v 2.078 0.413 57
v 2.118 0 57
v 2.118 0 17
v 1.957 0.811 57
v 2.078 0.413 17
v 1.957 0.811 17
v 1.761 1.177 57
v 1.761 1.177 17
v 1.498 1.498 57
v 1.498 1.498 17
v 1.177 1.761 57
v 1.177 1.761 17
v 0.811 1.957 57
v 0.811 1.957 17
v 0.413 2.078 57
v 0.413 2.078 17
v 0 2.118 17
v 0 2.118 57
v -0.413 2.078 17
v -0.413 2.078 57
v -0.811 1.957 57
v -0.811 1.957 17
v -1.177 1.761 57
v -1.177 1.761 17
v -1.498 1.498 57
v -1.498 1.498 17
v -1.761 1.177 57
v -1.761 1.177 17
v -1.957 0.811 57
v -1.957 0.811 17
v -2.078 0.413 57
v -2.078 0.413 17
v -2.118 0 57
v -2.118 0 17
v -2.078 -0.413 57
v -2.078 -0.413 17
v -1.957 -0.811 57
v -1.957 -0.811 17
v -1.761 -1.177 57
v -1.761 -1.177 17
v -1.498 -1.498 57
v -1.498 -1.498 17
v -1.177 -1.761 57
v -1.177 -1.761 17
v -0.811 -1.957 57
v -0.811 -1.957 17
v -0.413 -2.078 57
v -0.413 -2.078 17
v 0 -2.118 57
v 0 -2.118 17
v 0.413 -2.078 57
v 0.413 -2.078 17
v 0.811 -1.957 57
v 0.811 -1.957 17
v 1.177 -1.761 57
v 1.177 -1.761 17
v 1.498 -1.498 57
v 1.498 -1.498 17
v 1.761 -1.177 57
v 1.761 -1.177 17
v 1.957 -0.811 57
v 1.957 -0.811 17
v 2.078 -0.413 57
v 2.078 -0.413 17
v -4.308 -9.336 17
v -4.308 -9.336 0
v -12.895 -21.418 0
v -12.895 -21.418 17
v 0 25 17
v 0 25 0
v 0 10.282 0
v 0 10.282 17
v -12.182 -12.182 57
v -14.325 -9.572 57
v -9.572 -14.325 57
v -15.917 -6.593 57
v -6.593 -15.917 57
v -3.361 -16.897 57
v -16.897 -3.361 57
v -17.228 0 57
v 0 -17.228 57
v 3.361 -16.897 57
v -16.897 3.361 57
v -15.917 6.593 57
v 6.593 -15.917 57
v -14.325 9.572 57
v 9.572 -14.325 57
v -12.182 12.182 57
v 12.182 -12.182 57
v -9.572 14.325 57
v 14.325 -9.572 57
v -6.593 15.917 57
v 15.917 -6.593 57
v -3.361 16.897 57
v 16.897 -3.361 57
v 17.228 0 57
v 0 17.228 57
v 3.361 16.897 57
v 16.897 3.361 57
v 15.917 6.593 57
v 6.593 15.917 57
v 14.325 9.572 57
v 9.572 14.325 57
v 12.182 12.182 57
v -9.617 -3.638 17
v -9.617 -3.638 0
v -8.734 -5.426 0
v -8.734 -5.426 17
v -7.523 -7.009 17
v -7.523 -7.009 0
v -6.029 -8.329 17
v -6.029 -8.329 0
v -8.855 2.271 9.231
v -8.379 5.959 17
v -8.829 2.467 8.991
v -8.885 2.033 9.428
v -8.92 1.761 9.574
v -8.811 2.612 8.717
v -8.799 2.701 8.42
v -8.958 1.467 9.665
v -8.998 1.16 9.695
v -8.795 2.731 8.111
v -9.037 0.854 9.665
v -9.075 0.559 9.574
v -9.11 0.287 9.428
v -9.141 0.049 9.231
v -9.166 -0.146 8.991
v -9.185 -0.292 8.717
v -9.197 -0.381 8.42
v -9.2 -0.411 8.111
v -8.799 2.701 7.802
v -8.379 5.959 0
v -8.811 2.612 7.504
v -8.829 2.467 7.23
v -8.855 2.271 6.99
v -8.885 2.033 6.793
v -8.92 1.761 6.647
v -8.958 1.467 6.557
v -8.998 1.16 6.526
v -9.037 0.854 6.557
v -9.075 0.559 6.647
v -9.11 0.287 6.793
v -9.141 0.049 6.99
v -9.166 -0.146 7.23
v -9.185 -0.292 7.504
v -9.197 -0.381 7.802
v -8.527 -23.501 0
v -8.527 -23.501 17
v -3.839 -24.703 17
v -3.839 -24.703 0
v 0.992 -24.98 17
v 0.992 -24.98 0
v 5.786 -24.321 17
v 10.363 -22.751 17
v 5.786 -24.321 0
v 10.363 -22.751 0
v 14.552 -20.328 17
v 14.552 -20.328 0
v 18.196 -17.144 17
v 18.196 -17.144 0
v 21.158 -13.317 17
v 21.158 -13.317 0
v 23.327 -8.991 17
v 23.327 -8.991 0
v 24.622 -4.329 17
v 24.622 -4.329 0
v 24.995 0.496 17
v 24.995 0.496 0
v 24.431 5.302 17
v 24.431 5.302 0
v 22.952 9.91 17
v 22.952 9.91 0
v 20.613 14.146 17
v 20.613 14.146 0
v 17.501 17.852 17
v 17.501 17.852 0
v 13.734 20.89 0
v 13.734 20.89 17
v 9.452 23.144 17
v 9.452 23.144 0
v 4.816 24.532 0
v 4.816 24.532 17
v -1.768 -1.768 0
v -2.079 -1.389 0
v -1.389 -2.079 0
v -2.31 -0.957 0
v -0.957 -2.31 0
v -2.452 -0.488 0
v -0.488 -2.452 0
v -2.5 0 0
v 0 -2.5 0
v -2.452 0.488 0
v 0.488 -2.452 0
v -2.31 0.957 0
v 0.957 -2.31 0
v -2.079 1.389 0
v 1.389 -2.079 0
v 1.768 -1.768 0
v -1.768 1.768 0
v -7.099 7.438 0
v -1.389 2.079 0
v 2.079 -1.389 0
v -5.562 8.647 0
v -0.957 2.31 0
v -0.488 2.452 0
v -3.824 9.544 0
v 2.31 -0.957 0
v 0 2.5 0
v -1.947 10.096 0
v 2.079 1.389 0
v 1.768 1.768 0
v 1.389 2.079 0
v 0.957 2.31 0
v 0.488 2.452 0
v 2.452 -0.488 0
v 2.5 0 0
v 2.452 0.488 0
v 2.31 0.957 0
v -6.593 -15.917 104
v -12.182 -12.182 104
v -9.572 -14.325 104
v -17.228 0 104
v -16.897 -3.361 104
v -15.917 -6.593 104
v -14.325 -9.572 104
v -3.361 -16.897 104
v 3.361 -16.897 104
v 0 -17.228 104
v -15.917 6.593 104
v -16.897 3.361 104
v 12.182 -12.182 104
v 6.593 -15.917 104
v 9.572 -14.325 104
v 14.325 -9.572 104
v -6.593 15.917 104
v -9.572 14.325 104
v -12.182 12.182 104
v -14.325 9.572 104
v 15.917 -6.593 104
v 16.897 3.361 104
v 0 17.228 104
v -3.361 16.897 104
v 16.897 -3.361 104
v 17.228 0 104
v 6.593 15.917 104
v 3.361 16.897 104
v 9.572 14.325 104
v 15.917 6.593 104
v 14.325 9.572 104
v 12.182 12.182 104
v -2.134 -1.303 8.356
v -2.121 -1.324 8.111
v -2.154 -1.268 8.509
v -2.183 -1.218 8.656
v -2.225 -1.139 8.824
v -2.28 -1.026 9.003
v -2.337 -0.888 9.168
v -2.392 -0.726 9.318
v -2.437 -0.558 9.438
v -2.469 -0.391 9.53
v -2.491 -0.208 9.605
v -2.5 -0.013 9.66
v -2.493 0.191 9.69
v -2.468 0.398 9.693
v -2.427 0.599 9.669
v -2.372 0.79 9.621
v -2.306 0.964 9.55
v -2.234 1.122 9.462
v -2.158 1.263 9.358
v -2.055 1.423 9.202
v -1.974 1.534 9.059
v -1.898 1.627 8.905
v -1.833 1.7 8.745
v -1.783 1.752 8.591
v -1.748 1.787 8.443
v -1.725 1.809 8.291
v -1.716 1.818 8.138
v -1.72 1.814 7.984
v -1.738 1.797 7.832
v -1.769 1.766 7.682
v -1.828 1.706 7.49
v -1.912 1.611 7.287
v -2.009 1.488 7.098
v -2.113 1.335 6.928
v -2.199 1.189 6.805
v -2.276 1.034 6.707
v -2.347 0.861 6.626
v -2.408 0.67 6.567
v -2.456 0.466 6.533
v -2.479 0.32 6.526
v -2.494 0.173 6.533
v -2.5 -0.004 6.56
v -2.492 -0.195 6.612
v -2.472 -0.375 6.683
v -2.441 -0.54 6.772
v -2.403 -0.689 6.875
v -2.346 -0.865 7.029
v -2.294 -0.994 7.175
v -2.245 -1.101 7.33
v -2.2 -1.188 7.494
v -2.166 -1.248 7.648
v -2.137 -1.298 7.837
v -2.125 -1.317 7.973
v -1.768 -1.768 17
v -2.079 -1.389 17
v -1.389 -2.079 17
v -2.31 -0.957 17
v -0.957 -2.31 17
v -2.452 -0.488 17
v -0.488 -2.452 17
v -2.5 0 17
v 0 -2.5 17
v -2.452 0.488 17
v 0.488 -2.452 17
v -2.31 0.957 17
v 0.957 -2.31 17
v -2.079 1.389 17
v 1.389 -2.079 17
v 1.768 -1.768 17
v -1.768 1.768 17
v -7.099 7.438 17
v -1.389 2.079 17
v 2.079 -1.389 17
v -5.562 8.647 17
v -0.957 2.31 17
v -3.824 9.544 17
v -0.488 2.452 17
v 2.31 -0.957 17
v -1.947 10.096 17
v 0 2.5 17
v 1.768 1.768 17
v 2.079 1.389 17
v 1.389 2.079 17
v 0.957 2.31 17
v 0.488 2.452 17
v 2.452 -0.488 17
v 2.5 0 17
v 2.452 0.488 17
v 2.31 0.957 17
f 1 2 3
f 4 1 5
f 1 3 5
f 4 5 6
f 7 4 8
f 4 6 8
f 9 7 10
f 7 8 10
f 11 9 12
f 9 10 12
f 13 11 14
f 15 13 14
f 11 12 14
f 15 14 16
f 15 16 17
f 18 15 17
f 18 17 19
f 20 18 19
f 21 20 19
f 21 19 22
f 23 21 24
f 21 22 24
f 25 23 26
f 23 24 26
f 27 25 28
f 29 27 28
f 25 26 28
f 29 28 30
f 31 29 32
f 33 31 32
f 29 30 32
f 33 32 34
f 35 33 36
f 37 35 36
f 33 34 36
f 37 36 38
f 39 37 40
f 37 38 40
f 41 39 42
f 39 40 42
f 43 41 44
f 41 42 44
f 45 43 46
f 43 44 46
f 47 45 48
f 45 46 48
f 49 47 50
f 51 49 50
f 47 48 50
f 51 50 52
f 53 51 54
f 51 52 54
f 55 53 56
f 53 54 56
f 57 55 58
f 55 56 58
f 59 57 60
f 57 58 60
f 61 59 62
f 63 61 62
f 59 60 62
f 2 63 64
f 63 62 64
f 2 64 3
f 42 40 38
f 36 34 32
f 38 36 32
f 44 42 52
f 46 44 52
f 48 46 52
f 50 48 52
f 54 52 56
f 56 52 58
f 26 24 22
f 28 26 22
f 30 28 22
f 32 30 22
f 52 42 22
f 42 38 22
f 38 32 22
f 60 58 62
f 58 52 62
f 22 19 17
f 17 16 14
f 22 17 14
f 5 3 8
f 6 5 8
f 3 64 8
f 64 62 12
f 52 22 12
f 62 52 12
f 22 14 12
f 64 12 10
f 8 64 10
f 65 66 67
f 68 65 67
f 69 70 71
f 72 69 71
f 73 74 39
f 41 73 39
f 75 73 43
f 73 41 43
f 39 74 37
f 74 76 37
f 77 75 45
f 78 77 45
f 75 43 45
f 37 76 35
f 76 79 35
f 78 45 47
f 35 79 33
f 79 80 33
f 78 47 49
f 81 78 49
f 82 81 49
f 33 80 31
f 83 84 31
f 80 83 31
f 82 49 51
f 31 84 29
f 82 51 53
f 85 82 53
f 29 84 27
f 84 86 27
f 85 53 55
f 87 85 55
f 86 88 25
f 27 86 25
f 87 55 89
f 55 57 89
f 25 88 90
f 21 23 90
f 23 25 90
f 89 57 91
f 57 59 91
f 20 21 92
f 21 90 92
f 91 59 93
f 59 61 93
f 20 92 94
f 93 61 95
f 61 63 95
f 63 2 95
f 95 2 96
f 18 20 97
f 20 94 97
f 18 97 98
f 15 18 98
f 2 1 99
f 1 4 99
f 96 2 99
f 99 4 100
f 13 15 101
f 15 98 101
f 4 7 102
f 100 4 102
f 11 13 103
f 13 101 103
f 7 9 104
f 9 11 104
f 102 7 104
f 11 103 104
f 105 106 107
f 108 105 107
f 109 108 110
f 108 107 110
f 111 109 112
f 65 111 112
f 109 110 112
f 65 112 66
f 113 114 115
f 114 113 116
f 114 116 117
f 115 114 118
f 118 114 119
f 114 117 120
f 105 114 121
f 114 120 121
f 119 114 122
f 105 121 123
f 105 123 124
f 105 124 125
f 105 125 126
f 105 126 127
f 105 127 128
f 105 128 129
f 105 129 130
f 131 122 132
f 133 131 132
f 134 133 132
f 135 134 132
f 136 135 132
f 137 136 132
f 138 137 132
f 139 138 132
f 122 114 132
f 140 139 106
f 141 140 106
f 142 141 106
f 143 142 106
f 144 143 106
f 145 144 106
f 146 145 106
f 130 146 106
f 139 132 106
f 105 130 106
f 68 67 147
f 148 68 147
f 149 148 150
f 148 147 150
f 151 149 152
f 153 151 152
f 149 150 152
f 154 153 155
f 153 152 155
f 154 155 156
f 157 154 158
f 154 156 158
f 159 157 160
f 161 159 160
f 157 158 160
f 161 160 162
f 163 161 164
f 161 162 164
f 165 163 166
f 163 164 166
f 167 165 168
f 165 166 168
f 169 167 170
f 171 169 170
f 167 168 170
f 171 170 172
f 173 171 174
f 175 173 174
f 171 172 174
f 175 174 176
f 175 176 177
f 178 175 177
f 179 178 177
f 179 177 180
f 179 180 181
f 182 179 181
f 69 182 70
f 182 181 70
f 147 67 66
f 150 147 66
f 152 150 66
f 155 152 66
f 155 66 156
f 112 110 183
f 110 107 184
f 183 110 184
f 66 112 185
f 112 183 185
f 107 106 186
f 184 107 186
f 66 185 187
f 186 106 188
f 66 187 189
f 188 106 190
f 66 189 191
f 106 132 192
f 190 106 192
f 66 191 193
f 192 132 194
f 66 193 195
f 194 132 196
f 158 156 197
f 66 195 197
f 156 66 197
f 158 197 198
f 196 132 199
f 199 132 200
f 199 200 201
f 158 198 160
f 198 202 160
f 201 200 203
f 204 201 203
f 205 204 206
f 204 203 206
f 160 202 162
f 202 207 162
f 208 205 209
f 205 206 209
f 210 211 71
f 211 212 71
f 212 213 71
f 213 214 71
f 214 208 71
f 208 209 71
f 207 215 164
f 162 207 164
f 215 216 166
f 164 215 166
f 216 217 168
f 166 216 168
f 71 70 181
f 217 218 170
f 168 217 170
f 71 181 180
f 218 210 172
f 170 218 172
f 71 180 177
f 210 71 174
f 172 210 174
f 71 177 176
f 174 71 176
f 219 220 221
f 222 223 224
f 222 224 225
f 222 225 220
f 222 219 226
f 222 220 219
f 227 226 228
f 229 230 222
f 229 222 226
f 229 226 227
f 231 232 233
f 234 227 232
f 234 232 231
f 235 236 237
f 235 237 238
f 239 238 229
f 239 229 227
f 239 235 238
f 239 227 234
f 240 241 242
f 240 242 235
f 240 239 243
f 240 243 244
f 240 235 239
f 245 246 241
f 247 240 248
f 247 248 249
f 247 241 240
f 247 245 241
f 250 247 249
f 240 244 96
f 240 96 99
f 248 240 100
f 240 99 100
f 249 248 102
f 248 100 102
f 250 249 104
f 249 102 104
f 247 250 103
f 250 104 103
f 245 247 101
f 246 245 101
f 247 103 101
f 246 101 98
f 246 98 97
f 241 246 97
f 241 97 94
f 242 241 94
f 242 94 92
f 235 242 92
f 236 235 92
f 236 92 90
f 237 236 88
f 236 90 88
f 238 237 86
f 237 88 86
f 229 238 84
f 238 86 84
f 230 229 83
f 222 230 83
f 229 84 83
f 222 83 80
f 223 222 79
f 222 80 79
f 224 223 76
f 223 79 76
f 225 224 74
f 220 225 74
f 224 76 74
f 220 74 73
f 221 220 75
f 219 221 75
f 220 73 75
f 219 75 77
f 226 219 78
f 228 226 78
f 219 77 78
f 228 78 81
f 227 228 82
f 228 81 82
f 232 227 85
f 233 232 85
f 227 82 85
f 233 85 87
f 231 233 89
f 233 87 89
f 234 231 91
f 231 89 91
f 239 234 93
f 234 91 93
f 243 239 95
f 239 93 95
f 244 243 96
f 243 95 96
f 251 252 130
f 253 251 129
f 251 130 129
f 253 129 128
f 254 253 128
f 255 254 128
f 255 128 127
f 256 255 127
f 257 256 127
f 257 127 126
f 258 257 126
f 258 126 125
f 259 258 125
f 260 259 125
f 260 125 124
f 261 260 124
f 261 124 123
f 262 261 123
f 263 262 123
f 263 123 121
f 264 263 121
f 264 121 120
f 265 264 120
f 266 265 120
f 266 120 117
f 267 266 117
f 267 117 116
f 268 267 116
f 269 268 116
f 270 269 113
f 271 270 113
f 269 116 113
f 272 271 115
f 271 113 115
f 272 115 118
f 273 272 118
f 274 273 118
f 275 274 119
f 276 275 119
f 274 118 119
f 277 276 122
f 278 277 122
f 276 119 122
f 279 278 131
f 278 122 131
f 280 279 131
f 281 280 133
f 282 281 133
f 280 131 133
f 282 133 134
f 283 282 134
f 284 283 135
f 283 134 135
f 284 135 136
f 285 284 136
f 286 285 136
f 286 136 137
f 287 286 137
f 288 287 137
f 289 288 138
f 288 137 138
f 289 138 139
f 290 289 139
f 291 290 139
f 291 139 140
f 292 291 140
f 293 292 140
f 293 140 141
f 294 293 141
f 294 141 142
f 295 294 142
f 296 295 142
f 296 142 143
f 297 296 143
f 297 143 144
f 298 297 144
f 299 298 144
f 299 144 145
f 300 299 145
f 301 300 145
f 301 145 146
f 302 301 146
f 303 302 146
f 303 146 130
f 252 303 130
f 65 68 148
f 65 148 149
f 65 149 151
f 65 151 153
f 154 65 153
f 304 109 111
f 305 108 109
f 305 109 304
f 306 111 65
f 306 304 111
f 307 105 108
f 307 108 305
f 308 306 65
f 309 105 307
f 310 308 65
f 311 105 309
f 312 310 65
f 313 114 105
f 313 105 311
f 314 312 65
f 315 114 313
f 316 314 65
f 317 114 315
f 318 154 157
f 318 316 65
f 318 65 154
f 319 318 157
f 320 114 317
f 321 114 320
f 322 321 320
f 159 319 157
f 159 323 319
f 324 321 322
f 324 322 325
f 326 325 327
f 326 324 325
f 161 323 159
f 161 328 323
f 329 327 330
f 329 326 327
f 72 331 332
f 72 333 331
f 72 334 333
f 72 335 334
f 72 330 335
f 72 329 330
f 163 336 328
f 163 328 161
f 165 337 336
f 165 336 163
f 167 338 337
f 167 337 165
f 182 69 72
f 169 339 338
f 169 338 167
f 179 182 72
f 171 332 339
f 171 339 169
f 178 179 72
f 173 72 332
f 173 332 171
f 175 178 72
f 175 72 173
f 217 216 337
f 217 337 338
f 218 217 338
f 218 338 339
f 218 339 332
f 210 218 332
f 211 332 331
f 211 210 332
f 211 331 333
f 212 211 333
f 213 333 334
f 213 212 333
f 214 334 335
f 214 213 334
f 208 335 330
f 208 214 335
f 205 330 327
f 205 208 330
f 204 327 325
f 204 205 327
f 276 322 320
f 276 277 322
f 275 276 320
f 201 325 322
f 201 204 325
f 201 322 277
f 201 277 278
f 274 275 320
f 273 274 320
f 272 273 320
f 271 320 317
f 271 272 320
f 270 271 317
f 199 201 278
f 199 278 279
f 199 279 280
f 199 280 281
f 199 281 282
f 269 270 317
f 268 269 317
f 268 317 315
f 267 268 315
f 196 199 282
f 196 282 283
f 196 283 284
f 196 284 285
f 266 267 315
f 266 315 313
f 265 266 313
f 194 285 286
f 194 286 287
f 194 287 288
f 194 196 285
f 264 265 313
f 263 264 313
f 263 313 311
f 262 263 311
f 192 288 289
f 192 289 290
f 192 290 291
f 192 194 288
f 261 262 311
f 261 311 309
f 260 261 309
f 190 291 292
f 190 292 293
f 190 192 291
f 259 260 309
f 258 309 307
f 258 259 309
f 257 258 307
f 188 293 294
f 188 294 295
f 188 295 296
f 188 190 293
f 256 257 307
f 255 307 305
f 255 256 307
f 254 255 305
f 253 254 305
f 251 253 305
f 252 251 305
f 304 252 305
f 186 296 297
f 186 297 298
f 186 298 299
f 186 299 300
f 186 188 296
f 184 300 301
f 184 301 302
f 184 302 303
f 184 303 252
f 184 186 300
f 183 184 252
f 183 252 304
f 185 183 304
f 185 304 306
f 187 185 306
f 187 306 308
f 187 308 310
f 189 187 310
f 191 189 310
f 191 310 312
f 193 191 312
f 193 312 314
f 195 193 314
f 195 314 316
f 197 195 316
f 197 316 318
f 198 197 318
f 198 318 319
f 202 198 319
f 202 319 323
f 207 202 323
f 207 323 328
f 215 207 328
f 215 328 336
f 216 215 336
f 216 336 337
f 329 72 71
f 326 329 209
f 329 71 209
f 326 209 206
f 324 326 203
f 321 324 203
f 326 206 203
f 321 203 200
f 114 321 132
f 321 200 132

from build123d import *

# Parameters (mm, degrees)
F0_R     = 2.5
F1_DEPTH = 17
F2_R     = 2.1183628734
F3_DEPTH = 40
F4_R     = 17.2283151163
F4_R_2   = 2.1183628734
F5_DEPTH = 47
F6_R     = 1.5843133583
F7_DEPTH = 7.1394056178


with BuildPart() as f1:
    # F0 (on Top) → F1 (new body)
    with BuildSketch(Plane.XY):
        with BuildLine():
            Line((-4.3080339444, -9.3356588295), (-12.8947155097, -21.4178970005))
            ThreePointArc((-12.8947155097, -21.4178970005), (24.0878332879, -6.6915086112), (0, 25))
            Line((0, 25), (0, 10.2817159194))
            ThreePointArc((0, 10.2817159194), (-4.7143324855, 9.1372179279), (-8.3791234153, 5.9585210444))
            Line((-8.3791234153, 5.9585210444), (-9.6165060123, -3.6381993296))
            ThreePointArc((-9.6165060123, -3.6381993296), (-7.5225304545, -7.0089384223), (-4.3080339444, -9.3356588295))
        make_face()
        Circle(F0_R, mode=Mode.SUBTRACT)
    extrude(amount=F1_DEPTH)

    # F6 (on face) → F7 (cut, through all)
    with BuildSketch(Plane(origin=(-8.9978147138, 1.1601608574, 0), x_dir=(-0.1278794515, -0.9917897186, 0), z_dir=(-0.9917897186, 0.1278794515, 0))):
        with Locations((0, 8.1106387079)):
            Circle(F6_R)
    extrude(amount=-F7_DEPTH, mode=Mode.SUBTRACT)


with BuildPart() as f3:
    # F2 (on face) → F3 (new body)
    with BuildSketch(Plane.XY.offset(17)):
        Circle(F2_R)
    extrude(amount=F3_DEPTH)

    # F4 (on face) → F5 (join)
    with BuildSketch(Plane.XY.offset(57)):
        Circle(F4_R)
        Circle(F4_R_2, mode=Mode.SUBTRACT)
        Circle(F4_R_2)
    extrude(amount=F5_DEPTH)


solid = Compound([f1.part, f3.part])
